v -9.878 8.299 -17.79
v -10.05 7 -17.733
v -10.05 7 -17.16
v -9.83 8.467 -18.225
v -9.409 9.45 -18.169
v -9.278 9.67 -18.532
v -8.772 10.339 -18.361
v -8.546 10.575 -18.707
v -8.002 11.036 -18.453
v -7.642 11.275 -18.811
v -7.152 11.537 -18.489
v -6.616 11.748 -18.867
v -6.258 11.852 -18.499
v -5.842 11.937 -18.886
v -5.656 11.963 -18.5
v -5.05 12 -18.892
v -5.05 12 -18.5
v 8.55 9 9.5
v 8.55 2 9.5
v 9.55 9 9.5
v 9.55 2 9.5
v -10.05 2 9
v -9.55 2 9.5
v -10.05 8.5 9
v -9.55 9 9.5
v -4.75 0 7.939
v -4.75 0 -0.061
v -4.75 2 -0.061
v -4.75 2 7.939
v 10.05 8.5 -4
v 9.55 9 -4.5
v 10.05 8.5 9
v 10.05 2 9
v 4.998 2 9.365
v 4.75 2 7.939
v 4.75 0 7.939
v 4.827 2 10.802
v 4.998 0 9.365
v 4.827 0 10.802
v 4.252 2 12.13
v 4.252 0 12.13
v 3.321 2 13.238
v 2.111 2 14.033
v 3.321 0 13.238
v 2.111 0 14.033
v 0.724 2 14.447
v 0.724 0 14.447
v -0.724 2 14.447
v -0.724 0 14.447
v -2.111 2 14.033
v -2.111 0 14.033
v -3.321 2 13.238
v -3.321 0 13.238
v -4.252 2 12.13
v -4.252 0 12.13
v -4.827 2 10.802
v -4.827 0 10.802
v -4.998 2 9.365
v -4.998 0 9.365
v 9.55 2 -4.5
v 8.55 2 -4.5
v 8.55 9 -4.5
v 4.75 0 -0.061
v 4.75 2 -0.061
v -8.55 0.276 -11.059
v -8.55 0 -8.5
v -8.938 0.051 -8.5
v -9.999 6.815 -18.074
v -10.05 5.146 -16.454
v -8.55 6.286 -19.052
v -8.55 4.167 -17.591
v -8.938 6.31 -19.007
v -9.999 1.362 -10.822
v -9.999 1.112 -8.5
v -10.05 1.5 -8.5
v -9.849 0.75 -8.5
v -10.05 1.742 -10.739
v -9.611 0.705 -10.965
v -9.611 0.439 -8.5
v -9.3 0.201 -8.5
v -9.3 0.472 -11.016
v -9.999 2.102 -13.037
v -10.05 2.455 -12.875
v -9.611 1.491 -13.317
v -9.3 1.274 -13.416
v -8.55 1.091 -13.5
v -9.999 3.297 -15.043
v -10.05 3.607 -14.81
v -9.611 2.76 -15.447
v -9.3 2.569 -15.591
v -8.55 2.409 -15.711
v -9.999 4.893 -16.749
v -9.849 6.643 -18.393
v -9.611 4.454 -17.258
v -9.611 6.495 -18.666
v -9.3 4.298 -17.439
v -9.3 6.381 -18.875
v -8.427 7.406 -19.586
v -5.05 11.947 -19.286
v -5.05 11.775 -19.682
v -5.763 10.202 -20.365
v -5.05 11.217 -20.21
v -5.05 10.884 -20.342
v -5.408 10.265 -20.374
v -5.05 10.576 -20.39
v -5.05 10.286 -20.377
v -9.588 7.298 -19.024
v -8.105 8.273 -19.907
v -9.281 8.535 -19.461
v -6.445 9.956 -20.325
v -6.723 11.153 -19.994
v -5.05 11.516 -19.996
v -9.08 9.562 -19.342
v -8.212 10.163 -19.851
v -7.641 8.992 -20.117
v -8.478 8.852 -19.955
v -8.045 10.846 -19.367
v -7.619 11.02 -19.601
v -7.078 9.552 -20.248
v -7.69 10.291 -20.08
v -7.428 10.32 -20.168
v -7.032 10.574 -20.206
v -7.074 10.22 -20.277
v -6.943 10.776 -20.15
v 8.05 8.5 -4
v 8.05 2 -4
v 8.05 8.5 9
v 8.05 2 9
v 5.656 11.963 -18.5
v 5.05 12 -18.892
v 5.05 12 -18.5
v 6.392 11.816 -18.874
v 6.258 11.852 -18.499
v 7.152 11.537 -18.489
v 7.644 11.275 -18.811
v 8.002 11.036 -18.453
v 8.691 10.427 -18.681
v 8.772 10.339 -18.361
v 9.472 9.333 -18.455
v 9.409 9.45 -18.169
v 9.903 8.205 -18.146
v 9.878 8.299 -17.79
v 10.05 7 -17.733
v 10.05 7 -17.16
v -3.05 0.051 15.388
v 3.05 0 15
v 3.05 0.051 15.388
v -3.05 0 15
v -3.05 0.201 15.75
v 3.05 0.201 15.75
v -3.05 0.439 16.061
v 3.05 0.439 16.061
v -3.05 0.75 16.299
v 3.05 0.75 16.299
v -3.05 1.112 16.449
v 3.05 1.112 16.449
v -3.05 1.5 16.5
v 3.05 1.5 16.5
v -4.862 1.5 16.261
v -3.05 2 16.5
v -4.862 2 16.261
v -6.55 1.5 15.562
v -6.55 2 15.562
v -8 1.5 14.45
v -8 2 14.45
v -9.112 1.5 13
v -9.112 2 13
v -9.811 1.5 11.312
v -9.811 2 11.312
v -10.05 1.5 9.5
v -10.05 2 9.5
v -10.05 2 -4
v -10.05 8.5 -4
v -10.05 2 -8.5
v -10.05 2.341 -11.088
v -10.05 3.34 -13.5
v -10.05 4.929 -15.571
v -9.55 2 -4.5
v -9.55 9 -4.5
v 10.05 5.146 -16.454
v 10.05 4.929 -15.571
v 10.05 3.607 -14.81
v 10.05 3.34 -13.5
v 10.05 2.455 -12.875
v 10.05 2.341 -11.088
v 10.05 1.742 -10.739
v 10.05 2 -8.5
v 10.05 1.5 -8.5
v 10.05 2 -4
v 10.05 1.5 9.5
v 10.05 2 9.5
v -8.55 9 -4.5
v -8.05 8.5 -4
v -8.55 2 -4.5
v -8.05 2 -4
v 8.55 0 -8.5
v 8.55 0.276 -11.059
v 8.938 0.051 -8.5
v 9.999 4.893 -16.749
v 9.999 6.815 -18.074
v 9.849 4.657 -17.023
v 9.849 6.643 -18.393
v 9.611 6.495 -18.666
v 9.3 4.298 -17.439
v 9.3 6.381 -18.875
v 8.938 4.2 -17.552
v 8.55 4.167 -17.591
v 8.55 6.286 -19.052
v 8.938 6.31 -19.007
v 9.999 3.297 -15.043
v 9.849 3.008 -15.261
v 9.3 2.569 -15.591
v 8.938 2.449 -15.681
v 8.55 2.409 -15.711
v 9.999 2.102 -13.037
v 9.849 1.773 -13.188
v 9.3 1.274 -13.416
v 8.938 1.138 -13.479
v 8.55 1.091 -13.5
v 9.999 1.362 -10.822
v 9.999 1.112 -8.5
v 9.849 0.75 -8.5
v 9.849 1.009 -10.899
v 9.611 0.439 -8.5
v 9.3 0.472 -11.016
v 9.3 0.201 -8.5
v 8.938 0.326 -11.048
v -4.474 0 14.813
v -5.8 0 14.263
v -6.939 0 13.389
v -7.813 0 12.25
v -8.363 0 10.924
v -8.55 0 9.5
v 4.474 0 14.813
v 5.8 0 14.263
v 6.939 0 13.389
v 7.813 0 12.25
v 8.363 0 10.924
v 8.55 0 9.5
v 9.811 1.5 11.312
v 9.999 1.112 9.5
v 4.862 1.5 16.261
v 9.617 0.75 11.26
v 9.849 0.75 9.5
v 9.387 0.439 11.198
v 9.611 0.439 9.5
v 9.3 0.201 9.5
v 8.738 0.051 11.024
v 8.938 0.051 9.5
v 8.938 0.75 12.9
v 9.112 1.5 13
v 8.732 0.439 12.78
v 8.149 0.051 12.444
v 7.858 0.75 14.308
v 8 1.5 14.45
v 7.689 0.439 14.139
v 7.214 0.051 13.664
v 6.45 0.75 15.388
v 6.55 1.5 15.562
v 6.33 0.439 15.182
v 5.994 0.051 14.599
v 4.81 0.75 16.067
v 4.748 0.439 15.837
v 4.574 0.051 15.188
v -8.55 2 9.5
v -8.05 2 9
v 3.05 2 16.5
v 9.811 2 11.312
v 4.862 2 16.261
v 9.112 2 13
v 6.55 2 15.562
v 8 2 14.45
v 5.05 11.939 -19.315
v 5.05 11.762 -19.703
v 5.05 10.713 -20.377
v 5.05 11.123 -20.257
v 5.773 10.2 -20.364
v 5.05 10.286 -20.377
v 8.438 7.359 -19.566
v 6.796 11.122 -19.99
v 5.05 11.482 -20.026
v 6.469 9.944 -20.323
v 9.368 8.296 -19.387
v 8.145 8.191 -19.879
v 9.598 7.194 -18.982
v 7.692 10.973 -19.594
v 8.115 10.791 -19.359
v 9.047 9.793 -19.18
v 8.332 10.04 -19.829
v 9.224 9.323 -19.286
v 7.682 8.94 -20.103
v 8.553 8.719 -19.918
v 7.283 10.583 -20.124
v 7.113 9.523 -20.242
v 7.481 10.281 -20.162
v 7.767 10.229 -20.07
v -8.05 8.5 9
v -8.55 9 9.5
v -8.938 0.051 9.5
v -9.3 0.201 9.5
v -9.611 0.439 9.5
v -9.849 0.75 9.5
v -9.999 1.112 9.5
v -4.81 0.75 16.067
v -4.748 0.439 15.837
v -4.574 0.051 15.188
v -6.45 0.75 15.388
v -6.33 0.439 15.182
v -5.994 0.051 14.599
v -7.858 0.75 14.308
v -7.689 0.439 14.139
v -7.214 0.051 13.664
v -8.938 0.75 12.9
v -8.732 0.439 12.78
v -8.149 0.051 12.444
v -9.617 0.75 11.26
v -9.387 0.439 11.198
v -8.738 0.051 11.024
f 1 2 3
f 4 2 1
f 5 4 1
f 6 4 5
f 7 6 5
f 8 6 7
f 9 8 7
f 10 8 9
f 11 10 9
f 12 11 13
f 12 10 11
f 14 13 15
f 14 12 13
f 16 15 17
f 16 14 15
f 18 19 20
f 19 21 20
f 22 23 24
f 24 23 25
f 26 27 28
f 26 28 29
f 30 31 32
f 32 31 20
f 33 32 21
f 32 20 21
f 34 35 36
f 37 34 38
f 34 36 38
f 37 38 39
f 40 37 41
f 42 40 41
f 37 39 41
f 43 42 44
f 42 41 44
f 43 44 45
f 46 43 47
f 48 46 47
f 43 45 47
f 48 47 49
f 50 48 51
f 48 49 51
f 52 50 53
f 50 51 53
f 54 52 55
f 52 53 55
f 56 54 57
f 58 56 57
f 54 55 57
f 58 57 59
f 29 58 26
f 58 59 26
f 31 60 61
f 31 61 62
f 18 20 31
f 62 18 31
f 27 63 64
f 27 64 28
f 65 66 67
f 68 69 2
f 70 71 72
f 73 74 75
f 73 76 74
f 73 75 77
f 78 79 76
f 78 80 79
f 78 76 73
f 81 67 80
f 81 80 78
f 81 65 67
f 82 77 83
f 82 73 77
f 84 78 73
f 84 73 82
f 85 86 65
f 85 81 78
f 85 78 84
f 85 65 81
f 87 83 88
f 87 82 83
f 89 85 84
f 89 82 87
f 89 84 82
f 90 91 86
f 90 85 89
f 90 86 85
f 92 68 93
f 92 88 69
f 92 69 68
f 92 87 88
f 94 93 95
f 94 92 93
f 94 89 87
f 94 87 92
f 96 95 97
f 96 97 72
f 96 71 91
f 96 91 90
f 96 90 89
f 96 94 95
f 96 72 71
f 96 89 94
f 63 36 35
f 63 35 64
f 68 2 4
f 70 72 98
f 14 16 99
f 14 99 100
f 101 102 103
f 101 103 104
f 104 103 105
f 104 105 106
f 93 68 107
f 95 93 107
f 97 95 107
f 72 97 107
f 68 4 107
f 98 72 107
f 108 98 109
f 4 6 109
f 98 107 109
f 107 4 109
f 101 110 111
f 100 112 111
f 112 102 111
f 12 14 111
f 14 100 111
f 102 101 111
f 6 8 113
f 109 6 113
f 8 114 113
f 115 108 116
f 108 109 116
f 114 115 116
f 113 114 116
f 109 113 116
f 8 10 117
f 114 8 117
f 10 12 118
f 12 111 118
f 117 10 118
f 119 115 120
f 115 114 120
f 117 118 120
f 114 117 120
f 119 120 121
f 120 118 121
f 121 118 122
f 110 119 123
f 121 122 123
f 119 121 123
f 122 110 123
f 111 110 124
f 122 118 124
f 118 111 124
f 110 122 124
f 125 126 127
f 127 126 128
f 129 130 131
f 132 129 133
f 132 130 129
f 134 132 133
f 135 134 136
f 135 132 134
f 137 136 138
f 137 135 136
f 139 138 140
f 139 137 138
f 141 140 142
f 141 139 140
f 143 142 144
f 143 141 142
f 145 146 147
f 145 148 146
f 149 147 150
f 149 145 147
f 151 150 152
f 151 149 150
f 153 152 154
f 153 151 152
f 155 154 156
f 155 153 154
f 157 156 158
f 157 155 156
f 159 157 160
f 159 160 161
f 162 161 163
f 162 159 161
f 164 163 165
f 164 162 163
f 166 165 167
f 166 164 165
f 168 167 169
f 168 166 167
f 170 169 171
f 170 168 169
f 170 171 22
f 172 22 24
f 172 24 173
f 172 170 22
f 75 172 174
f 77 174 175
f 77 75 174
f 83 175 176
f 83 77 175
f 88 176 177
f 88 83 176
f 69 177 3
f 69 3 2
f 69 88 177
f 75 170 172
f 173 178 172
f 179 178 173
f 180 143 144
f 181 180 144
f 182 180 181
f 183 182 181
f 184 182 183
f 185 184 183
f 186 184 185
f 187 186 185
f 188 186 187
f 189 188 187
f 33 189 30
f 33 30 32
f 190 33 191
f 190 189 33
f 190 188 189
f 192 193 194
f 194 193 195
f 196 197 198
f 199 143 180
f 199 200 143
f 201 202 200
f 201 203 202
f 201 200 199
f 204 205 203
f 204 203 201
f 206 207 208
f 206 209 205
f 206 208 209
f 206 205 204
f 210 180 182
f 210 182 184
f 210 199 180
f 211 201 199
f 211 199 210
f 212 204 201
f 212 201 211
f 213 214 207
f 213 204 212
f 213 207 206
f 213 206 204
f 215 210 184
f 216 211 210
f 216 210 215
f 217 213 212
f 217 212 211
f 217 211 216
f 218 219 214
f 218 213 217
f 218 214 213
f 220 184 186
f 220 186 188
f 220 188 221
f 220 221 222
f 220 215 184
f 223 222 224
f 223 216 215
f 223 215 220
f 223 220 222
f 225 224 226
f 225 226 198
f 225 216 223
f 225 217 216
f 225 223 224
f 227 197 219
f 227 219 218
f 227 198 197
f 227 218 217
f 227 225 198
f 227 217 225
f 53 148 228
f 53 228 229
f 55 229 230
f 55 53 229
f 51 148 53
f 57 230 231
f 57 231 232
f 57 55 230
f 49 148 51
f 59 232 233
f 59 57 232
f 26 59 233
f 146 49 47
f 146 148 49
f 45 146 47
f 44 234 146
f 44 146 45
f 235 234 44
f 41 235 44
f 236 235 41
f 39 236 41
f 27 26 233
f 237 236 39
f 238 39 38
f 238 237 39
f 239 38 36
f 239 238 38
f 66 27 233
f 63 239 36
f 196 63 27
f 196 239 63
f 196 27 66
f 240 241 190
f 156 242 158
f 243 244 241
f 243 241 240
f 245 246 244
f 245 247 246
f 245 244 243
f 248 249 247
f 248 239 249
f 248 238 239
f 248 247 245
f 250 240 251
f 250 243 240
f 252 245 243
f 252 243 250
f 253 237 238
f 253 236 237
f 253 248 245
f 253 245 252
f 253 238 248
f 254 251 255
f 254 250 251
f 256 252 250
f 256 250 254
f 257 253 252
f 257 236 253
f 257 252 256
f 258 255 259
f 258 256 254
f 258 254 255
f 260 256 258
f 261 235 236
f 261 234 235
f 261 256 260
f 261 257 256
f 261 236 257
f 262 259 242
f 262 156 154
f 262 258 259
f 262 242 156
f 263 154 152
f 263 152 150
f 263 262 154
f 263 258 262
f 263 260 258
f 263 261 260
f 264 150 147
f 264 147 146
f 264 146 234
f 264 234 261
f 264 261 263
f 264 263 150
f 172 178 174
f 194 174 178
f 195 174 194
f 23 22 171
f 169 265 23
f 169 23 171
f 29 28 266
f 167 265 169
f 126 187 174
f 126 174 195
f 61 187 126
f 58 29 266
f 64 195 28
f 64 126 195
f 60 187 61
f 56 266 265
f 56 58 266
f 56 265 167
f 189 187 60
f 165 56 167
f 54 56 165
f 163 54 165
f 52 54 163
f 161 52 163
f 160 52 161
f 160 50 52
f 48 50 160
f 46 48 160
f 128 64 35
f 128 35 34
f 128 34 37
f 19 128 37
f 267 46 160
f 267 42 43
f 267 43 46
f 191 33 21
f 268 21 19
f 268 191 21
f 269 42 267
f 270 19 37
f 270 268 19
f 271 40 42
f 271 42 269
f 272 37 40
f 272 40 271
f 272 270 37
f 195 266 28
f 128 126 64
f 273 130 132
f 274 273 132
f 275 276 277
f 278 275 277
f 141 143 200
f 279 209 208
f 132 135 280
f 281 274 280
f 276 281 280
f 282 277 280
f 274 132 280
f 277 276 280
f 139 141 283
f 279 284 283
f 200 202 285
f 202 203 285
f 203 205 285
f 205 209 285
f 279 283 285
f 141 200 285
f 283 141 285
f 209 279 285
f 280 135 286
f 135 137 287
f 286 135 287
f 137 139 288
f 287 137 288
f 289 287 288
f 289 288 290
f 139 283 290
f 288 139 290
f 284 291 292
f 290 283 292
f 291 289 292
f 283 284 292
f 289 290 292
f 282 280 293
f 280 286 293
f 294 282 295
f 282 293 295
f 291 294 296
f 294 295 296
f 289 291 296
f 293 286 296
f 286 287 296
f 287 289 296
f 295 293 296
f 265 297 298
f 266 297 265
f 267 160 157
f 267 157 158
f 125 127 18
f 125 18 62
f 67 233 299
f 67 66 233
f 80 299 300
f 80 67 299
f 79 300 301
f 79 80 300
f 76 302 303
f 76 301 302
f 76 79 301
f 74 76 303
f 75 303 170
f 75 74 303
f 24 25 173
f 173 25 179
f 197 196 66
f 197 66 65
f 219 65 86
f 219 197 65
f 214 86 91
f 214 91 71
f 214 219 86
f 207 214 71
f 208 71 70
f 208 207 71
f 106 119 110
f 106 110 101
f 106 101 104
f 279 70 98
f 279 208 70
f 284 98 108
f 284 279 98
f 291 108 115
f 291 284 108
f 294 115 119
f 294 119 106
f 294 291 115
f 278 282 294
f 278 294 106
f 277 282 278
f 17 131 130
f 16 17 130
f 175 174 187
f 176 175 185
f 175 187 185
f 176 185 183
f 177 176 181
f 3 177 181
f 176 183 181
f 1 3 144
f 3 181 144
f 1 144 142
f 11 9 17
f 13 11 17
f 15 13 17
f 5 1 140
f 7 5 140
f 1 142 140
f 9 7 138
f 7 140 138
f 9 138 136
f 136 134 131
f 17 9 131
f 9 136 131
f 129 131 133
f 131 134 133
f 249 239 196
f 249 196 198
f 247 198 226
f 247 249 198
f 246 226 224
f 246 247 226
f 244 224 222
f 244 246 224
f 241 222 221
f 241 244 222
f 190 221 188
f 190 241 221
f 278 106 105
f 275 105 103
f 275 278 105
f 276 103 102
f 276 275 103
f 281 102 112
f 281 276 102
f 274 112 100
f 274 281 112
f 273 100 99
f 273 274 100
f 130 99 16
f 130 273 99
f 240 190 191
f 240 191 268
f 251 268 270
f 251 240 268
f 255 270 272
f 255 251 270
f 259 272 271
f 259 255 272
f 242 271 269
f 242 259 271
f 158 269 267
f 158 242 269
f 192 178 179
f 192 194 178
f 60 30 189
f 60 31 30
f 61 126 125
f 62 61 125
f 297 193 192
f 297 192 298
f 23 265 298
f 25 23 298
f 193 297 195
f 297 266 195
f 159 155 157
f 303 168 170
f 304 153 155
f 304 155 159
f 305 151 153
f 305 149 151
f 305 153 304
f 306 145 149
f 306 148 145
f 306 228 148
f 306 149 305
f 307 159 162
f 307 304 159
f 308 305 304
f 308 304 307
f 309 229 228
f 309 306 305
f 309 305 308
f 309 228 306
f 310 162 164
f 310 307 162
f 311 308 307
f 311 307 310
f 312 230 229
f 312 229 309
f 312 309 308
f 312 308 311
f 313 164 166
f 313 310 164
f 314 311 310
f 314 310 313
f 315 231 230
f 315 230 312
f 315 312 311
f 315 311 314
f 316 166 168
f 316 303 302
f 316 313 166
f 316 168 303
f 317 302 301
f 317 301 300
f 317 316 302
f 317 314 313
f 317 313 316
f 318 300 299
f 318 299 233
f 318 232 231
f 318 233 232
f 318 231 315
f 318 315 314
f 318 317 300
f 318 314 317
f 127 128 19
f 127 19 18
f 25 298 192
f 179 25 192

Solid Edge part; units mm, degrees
sketch "Sketch1" plane through (0, 0, 0) normal (0, -1, 0) x (1, 0, 0)
  line L0 (-8.05, -17.5) -> (8.05, -17.5)
  line L1 (8.05, -17.5) -> (8.05, 17.5)
  line L2 (8.05, 17.5) -> (-8.05, 17.5)
  line L3 (-8.05, 17.5) -> (-8.05, -17.5)
  dimension "D1" = 16.1
  dimension "D2" = 35
extrude "Protrusion1" add sketch "Sketch1" against normal blind 2
sketch "Sketch2" plane through (0, 0, 0) normal (0, -1, 0) x (1, 0, 0)
  line L0 (-10.05, -19.5) -> (10.05, -19.5)
  line L1 (10.05, -19.5) -> (10.05, 19.5)
  line L2 (10.05, 19.5) -> (-10.05, 19.5)
  line L3 (-10.05, 19.5) -> (-10.05, -19.5)
  line L4 (-8.05, -17.5) -> (8.05, -17.5)
  line L5 (8.05, -17.5) -> (8.05, 17.5)
  line L6 (8.05, 17.5) -> (-8.05, 17.5)
  line L7 (-8.05, 17.5) -> (-8.05, -17.5)
  dimension "D1" = 2
  dimension "D2" = 2
extrude "Extrusionsausprägung_2" add sketch "Sketch2" against normal blind 9
sketch "Sketch3" plane through (0, 0, 0) normal (0, -1, 0) x (1, 0, 0)
  circle A0 centre (0, 9.5) radius 5
  dimension "D1" = 10
  dimension "D2" = 10
extrude "Cutout1" cut sketch "Sketch3" against normal through all
sketch "Sketch4" plane through (0, 0, 0) normal (0, -1, 0) x (1, 0, 0)
  line L0 (-4.75, 7.9388) -> (4.75, 7.9388)
  line L1 (4.75, 7.9388) -> (4.75, -0.0612)
  line L2 (4.75, -0.0612) -> (-4.75, -0.0612)
  line L3 (-4.75, -0.0612) -> (-4.75, 7.9388)
  dimension "D1" = 9.5
  dimension "D2" = 8
extrude "Cutout2" cut sketch "Sketch4" against normal through all
chamfer "Fase_1" distance 0.5 angle 45 8 edges at (0, 9, 19.5) (0, 9, 17.5) (10.05, 9, 0) (8.05, 9, 0) (-8.05, 9, 0) (-10.05, 9, 0) (0, 9, -19.5) (0, 9, -17.5)
sketch "Sketch5" plane through (10.05, 5.75, 0) normal (1, 0, 0) x (0, 0, -1)
  line L0 (-19.5, -3.75) -> (-9.5, -3.75)
  line L1 (-9.5, -3.75) -> (-9.5, 3.25)
  line L2 (-9.5, 3.25) -> (-19.5, 3.25)
  line L3 (-19.5, 3.25) -> (-19.5, -3.75)
  line L4 (19.5, -3.75) -> (4.5, -3.75)
  line L5 (4.5, -3.75) -> (4.5, 3.25)
  line L6 (4.5, 3.25) -> (19.5, 3.25)
  line L7 (19.5, 3.25) -> (19.5, -3.75)
  dimension "D1" = 15
  dimension "D2" = 10
extrude "Cutout3" cut sketch "Sketch5" against normal through all
chamfer "Fase_3" distance 0.5 angle 45 8 edges at (10.05, 5.25, -4.5) (8.05, 5.25, -4.5) (-8.05, 5.25, -4.5) (-10.05, 5.25, -4.5) (-8.05, 5.25, 9.5) (-10.05, 5.25, 9.5) (8.05, 5.25, 9.5) (10.05, 5.25, 9.5)
sketch "Sketch6" plane through (0, 2, 0) normal (0, 1, 0) x (-1, 0, 0)
  line L0 (-10.05, 19.5) -> (10.05, 19.5)
  line L1 (10.05, 19.5) -> (10.05, 16.5)
  line L2 (10.05, 16.5) -> (-10.05, 16.5)
  line L3 (-10.05, 16.5) -> (-10.05, 19.5)
  dimension "D1" = 3
extrude "Cutout4" cut sketch "Sketch6" against normal through all
fillet "Verrundung_4" radius 7 2 edges at (10.05, 1, 16.5) (-10.05, 1, 16.5)
sketch "Sketch7" plane through (10.05, 4.25, -5) normal (1, 0, 0) x (0, -1, 0)
  line L0 (2.25, 14.5) -> (4.25, 14.5)
  line L1 (4.25, 14.5) -> (4.25, 3.5)
  line L2 (4.25, 3.5) -> (2.25, 3.5)
  line L3 (2.25, 3.5) -> (2.25, 14.5)
  dimension "D1" = 25
extrude "Cutout5" cut sketch "Sketch7" against normal through all
sketch "Sketch8" plane through (10.05, 4.25, 0.5) normal (1, 0, 0) x (0, -1, 0)
  arc A0 (2.25, 9) -> (-7.75, 19) centre (-7.75, 9) ccw
  line L0 (-7.75, 19) -> (-7.75, 21)
  arc A1 (-7.75, 21) -> (4.25, 9) centre (-7.75, 9) cw
  line L1 (4.25, 9) -> (2.25, 9)
  dimension "D1" = 10
extrude "Protrusion2" add sketch "Sketch8" against normal up to vertex (20.1 mm away)
fillet "Verrundung_5" radius 5 2 edges at (10.05, 12, -19.5) (-10.05, 12, -19.5)
fillet "Verrundung_6" radius 1.5 10 edges at (10.05, 1.9005, -14.9807) (10.05, 0, 0.5) (7.9997, 0, 14.4497) (0, 0, 16.5) (-7.9997, 0, 14.4497) (-10.05, 0, 0.5) (-10.05, 1.9005, -14.9807) (-8.6361, 10.4842, -20.4039) (0, 12, -20.5) (8.6361, 10.4842, -20.4039)
